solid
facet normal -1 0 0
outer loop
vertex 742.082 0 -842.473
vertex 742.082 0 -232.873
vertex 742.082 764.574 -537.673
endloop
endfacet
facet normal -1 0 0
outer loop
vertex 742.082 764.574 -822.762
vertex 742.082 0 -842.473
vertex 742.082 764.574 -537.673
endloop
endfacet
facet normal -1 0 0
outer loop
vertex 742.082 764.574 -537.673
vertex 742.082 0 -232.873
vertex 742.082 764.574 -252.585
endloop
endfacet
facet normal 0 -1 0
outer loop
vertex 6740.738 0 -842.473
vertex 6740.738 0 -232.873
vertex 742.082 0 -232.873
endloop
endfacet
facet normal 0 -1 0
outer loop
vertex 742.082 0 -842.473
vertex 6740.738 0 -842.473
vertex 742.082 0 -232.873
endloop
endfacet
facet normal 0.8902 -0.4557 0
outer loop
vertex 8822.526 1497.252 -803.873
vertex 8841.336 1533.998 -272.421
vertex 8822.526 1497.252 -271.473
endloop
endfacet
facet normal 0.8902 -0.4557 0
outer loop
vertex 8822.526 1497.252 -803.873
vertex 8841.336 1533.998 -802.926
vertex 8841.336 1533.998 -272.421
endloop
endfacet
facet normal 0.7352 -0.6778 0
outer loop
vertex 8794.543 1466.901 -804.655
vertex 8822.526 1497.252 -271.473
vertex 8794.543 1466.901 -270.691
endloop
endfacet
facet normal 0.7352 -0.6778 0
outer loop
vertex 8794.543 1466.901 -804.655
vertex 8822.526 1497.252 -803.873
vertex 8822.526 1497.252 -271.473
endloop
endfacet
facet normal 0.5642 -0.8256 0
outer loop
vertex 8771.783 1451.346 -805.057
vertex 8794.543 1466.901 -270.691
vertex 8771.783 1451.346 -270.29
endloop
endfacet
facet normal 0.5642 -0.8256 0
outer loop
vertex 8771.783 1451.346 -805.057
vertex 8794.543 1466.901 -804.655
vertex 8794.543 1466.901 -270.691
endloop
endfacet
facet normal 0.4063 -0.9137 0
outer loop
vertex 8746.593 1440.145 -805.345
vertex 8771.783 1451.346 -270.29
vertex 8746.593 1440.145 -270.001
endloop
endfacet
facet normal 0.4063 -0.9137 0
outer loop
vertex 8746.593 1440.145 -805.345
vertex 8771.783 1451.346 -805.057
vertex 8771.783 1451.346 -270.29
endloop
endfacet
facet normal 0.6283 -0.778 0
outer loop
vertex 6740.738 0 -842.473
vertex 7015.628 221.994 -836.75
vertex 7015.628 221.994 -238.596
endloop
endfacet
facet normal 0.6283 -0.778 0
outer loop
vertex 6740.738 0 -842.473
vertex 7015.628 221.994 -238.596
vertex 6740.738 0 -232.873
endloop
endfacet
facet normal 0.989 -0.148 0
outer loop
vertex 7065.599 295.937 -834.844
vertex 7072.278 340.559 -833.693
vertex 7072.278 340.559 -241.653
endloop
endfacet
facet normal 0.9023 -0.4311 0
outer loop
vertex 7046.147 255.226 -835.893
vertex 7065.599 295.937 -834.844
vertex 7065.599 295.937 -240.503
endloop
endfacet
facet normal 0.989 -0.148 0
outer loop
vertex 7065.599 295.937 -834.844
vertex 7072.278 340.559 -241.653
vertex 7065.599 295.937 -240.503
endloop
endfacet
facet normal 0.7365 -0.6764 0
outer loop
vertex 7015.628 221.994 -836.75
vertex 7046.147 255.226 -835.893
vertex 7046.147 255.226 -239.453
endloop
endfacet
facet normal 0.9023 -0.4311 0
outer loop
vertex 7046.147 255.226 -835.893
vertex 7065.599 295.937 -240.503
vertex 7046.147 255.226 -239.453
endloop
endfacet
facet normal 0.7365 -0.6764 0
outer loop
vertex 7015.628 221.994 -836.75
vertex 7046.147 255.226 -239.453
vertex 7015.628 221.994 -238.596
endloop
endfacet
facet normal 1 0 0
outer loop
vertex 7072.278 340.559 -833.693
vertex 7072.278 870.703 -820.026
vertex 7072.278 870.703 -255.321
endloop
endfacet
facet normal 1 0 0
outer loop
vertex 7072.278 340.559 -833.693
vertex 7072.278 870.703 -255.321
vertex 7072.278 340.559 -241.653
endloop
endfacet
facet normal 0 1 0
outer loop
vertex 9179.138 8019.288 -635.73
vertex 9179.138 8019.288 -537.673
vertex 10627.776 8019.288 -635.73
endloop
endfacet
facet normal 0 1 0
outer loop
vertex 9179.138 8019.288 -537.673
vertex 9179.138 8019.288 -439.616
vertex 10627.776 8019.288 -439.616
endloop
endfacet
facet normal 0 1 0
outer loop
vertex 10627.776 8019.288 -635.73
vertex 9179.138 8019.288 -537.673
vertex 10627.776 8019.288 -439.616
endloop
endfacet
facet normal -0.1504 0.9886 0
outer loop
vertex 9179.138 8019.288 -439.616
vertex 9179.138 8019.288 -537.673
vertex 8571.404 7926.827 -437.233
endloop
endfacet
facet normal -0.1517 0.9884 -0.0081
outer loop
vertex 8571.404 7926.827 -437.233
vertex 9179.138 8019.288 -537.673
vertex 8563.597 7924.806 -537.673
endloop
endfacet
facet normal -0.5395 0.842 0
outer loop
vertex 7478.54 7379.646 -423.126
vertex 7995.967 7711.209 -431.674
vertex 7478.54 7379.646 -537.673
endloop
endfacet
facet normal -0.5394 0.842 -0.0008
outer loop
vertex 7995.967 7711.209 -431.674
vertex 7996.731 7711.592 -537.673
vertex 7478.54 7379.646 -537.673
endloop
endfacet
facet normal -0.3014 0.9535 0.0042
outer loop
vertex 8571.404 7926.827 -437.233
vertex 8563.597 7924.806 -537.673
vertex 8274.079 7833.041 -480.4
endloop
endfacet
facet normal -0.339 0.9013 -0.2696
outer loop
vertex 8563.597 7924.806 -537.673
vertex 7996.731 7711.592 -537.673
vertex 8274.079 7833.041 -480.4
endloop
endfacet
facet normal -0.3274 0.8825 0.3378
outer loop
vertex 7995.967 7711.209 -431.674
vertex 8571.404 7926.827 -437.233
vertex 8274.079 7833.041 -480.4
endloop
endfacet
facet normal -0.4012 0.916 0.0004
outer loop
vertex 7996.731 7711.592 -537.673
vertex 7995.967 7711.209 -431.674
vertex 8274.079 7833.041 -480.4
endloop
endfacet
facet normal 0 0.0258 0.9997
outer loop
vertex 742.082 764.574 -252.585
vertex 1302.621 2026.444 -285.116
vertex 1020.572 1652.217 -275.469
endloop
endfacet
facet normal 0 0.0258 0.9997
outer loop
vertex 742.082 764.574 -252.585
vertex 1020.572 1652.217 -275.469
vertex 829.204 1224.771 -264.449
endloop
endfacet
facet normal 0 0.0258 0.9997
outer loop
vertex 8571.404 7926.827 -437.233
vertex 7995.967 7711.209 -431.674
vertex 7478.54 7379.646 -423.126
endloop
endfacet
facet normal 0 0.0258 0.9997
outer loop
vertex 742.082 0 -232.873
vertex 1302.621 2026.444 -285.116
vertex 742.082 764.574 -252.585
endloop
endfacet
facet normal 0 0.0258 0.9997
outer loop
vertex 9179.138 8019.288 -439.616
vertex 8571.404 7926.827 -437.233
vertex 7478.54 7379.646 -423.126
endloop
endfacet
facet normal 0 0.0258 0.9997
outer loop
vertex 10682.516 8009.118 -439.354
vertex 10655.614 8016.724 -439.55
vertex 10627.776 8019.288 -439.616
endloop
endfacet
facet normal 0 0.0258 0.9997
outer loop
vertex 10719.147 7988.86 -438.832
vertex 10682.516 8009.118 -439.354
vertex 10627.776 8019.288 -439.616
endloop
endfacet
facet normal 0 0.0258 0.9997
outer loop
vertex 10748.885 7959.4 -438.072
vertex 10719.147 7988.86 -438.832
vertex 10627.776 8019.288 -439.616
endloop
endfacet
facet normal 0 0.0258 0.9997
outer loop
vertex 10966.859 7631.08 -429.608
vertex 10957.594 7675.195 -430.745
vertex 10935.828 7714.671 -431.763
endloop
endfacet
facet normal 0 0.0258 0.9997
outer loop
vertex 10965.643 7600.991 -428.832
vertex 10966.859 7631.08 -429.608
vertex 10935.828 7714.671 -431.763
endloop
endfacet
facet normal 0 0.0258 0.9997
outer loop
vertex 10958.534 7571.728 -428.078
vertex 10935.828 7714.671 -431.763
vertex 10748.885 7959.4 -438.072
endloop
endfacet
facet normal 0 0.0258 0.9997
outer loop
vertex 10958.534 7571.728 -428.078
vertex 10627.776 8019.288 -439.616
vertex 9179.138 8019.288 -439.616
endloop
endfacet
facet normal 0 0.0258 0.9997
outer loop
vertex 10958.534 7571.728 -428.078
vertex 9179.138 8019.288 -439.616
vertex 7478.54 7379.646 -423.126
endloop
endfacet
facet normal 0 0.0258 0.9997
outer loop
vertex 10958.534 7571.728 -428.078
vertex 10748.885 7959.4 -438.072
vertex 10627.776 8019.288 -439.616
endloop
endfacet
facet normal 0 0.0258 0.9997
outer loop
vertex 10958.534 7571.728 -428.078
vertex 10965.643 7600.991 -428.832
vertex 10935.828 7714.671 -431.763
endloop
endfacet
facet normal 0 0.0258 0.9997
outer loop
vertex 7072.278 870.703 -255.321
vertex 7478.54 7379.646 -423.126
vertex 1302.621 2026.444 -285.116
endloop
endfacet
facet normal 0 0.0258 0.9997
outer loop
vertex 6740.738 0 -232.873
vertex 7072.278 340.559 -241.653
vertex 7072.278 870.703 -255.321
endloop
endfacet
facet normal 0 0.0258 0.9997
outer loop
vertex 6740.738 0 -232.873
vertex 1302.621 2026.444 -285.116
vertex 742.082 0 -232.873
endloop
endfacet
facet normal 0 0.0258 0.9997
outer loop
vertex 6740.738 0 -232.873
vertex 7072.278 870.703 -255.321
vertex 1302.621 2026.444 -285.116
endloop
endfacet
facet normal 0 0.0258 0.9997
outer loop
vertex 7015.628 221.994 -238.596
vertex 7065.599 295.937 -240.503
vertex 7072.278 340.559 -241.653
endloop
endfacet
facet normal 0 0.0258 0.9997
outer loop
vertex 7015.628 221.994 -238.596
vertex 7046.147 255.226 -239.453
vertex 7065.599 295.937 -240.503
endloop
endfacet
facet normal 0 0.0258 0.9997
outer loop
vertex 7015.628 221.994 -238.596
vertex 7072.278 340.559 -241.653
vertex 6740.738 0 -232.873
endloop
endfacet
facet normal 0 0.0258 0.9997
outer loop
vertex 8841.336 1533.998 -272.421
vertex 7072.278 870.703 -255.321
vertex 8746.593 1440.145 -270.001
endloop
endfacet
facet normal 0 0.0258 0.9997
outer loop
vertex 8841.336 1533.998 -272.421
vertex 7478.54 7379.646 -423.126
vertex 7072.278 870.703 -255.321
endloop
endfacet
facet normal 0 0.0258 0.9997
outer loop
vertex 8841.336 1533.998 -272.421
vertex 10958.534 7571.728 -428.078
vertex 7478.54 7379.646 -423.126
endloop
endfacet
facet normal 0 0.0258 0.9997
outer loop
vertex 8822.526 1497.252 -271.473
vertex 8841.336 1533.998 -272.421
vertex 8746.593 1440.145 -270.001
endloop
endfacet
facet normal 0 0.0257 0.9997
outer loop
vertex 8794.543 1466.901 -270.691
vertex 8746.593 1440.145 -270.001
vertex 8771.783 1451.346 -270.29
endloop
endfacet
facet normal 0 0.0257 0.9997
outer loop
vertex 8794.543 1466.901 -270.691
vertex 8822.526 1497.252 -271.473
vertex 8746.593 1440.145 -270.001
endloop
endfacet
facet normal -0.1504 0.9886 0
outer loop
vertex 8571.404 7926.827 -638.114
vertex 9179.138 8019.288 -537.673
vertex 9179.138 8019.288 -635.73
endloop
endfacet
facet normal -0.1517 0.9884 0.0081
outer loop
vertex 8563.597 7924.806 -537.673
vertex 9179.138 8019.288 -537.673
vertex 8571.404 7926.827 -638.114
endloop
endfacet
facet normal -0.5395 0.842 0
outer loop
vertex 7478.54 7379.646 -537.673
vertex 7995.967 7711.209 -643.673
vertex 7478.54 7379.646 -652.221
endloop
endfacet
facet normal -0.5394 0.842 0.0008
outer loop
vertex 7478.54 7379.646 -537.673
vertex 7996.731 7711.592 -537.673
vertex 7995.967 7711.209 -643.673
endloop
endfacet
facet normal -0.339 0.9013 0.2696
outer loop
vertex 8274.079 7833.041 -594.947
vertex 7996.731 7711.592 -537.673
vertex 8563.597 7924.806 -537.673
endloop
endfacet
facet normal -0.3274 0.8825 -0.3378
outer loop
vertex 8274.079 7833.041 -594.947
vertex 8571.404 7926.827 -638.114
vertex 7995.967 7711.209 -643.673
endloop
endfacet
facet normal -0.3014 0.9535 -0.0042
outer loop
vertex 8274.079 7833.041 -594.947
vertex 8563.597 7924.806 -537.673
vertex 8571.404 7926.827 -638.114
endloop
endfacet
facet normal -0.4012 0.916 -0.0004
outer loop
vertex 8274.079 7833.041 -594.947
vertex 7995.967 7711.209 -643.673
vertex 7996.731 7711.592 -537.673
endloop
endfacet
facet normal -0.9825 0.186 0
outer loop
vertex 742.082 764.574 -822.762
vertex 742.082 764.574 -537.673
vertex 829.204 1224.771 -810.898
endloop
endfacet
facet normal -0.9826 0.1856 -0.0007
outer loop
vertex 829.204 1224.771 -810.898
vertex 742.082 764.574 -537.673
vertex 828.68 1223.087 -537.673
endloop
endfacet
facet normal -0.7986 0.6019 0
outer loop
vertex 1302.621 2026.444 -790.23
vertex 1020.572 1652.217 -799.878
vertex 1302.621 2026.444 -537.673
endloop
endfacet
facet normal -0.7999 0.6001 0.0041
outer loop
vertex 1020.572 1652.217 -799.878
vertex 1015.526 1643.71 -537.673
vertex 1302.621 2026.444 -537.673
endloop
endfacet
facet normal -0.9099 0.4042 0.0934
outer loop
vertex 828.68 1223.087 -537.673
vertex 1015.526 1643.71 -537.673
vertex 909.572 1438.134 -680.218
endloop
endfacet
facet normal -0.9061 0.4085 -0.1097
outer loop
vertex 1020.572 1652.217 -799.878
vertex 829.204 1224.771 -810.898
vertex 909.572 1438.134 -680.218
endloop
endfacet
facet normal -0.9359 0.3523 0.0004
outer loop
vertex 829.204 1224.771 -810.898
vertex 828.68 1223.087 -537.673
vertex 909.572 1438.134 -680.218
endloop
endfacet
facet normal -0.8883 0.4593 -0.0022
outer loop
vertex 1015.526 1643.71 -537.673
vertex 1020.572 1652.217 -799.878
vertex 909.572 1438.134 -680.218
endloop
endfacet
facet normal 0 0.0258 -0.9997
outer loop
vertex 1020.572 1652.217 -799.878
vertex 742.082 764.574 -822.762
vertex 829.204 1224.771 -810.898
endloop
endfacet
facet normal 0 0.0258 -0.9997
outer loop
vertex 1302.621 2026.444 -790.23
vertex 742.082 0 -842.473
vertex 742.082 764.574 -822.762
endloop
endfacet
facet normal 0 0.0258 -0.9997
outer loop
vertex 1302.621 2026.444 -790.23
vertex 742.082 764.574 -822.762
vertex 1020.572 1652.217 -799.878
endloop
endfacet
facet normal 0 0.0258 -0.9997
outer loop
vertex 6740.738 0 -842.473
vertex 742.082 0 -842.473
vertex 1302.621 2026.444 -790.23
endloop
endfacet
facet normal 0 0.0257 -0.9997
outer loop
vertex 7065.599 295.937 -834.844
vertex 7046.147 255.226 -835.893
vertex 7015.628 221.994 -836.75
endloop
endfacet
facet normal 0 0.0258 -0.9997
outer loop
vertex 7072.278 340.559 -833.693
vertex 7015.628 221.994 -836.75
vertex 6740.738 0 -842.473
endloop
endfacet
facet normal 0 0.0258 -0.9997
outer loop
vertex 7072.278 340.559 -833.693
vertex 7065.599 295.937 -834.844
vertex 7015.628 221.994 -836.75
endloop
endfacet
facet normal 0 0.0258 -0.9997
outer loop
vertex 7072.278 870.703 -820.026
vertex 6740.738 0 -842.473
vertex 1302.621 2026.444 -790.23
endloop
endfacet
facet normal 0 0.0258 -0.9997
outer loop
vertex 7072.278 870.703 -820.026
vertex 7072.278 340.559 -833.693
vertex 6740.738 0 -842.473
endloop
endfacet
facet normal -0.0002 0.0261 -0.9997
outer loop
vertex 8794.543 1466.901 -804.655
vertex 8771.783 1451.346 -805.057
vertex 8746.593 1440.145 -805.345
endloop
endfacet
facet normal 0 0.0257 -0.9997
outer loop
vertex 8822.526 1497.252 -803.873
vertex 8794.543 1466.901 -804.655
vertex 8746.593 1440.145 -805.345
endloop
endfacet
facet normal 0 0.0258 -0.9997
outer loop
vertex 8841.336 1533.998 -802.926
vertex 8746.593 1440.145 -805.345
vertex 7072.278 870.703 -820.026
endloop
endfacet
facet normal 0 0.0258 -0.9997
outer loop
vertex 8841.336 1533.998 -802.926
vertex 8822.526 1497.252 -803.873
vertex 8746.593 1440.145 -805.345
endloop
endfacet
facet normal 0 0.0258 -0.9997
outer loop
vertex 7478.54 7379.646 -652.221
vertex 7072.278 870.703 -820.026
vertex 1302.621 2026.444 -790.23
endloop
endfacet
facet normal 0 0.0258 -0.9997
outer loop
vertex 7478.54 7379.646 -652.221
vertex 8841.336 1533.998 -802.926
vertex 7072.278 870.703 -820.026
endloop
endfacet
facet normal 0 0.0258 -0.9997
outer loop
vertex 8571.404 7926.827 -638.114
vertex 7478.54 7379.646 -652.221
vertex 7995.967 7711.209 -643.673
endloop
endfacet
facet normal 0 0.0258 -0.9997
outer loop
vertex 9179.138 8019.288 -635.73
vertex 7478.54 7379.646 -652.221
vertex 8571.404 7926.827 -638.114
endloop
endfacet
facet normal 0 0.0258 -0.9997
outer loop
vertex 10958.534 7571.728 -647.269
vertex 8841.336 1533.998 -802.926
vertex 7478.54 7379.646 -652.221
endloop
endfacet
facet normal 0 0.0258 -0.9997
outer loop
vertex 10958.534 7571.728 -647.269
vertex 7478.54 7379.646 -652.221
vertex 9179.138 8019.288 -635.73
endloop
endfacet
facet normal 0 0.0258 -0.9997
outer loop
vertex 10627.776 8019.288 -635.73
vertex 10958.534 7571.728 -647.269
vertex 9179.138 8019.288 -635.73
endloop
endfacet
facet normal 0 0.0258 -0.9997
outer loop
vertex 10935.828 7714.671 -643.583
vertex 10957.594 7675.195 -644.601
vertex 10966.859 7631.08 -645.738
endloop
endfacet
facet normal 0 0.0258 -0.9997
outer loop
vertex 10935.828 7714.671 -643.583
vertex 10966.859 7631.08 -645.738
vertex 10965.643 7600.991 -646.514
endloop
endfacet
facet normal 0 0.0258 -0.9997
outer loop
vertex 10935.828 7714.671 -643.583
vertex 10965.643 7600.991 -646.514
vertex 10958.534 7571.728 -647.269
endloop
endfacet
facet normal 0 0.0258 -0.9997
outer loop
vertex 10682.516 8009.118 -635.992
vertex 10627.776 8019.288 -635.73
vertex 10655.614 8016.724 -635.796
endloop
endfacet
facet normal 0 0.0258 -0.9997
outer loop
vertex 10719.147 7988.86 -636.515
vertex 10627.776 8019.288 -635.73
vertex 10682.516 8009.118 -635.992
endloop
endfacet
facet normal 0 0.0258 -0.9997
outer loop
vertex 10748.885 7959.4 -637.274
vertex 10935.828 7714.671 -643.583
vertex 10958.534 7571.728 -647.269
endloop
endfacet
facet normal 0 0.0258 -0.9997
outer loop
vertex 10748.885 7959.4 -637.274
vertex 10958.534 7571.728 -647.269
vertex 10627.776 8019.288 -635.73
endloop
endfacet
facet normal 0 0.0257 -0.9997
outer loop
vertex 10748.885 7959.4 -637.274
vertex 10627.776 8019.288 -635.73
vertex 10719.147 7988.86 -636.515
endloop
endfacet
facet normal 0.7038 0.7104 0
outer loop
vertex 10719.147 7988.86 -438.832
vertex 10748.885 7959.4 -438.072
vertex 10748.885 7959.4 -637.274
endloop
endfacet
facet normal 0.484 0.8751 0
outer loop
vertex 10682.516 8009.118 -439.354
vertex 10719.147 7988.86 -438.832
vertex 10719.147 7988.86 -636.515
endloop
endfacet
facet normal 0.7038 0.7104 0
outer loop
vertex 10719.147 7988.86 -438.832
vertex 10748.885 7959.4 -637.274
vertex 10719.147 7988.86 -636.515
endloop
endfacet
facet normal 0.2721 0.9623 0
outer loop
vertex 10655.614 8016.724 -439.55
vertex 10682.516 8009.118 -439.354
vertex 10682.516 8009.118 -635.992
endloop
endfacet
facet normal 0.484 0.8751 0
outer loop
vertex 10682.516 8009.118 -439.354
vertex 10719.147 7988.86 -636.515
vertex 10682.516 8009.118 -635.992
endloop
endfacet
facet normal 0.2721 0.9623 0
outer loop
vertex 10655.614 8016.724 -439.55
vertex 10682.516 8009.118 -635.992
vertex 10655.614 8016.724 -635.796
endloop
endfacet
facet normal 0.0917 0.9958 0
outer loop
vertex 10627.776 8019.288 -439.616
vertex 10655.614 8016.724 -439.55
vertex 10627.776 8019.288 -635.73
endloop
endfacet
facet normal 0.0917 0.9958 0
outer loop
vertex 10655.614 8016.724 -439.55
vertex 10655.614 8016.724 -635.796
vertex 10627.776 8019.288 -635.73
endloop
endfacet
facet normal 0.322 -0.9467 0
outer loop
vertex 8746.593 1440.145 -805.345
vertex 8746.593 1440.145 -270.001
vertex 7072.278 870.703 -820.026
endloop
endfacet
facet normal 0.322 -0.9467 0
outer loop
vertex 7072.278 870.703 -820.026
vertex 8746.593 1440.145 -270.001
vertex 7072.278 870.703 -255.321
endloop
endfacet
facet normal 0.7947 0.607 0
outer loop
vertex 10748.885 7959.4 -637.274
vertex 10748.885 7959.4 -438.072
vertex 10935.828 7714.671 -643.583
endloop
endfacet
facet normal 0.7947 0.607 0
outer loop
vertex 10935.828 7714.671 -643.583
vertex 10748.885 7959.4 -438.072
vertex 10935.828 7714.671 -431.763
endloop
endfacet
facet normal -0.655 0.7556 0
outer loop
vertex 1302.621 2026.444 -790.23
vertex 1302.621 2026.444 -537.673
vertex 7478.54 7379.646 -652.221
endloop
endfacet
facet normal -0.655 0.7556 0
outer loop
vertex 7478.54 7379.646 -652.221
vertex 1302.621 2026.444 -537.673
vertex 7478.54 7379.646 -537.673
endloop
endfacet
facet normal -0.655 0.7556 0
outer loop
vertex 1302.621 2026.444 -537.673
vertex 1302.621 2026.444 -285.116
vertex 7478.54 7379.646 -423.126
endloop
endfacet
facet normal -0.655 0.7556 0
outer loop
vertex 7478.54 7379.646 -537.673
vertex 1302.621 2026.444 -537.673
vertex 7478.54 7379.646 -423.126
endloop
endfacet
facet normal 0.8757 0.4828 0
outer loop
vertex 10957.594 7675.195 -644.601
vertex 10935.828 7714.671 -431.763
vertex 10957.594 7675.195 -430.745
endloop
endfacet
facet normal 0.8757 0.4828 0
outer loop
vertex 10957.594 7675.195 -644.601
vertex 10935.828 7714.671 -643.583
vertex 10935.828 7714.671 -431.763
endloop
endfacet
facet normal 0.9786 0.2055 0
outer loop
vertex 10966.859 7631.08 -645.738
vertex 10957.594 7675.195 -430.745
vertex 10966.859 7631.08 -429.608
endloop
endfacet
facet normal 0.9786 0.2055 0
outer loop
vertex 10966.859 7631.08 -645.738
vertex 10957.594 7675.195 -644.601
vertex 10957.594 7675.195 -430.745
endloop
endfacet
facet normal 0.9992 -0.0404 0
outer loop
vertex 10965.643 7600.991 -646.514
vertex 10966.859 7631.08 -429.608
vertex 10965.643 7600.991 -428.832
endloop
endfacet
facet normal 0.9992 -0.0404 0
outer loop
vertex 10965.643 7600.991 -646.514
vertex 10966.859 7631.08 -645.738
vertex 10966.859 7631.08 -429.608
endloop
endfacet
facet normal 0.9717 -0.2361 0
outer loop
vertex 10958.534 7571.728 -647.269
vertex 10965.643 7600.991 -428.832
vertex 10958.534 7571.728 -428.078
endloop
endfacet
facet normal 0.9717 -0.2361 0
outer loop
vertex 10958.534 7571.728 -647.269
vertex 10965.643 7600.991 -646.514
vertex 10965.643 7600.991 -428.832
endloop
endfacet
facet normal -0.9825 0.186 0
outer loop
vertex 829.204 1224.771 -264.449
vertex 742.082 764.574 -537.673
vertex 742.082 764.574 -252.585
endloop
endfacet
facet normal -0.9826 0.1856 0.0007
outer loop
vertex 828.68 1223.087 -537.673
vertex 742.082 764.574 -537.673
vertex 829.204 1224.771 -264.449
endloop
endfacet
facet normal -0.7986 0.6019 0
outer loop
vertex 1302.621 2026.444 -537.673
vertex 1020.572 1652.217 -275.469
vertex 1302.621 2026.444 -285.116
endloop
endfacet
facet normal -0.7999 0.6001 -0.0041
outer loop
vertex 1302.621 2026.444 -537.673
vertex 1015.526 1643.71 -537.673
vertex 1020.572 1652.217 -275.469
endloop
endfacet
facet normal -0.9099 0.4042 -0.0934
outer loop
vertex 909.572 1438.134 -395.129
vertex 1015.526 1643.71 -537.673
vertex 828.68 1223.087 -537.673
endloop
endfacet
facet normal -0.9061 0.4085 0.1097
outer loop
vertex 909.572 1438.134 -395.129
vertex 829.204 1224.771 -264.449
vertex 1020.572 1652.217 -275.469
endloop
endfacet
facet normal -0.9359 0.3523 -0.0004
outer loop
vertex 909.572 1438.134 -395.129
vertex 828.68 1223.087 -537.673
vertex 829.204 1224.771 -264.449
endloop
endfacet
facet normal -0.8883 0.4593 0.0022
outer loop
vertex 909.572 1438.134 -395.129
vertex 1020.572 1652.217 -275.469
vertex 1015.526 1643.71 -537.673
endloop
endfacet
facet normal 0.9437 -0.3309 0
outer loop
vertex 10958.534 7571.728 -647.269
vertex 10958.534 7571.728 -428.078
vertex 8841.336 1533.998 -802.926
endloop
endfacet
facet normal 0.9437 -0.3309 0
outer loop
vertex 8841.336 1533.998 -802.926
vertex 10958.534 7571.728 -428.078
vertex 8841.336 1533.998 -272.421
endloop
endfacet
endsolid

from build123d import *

# Parameters (mm, degrees)
BOSS_EXTRUDE1_DEPTH     = 304.8
CUT_EXTRUDE2_DEPTH      = 13037.539327922
CUT_EXTRUDE2_DEPTH_BACK = 13037.539327922
FILLET1_R               = 152.4
FILLET2_R               = 152.4
FILLET3_R               = 152.4
FILLET4_R               = 152.4


with BuildPart() as part:
    # Sketch5 → Boss-Extrude1 (new, symmetric)
    with BuildSketch(Plane.XY.offset(-537.673251463)):
        with BuildLine():
            Line((742.082193598, 0), (742.082193598, 764.574485823))
            add(Edge.make_bspline(
                [(742.082193598, 764.574485823), (796.791514491, 1480.759447712), (1302.621022267, 2026.444470026)],
                knots=[0, 0, 0, 1, 1, 1], degree=2))
            Line((1302.621022267, 2026.444470026), (7478.539858356, 7379.645861756))
            add(Edge.make_bspline(
                [(9179.137959243, 8019.288), (8219.319485977, 7966.614763447), (7478.539858356, 7379.645861756)],
                knots=[0, 0, 0, 1, 1, 1], degree=2))
            Line((9179.137959243, 8019.288), (10703.137959243, 8019.288))
            Line((10703.137959243, 8019.288), (10985.744450733, 7649.32510556))
            Line((10985.744450733, 7649.32510556), (8816.798294342, 1464.02172706))
            Line((8816.798294342, 1464.02172706), (7072.277988354, 870.702642997))
            Line((7072.277988354, 870.702642997), (7072.277988354, 267.743129387))
            Line((7072.277988354, 267.743129387), (6740.737959243, 0))
            Line((6740.737959243, 0), (742.082193598, 0))
        make_face()
    extrude(amount=BOSS_EXTRUDE1_DEPTH, both=True)

    # Sketch7 → Cut-Extrude2 (cut, two sides: drawn at the far end of the back side and taken through both)
    with BuildSketch(Plane.ZY.offset(-742.082193598).offset(-CUT_EXTRUDE2_DEPTH_BACK)):
        Polygon((-842.473251463, 0), (-635.730191879, 8019.288), (-1159.108406809, 8019.288), (-1159.108406809, 0), align=None)
        Polygon((-439.616311048, 8019.288), (-232.873251463, 0), (0, 0), (55.656264928, 8019.288), align=None)
    extrude(amount=CUT_EXTRUDE2_DEPTH + CUT_EXTRUDE2_DEPTH_BACK, mode=Mode.SUBTRACT)

    # Fillet1
    fillet1_edges = [part.edges().sort_by_distance(p)[0] for p in [
        (10703.137959243, 8019.288, -537.673251463),
    ]]
    fillet(fillet1_edges, radius=FILLET1_R)

    # Fillet2
    fillet2_edges = [part.edges().sort_by_distance(p)[0] for p in [
        (10985.744450733, 7649.32510556, -537.673251463),
    ]]
    fillet(fillet2_edges, radius=FILLET2_R)

    # Fillet3
    fillet3_edges = [part.edges().sort_by_distance(p)[0] for p in [
        (8816.798294342, 1464.02172706, -537.673251463),
    ]]
    fillet(fillet3_edges, radius=FILLET3_R)

    # Fillet4
    fillet4_edges = [part.edges().sort_by_distance(p)[0] for p in [
        (7072.277988354, 267.743129387, -537.673251463),
    ]]
    fillet(fillet4_edges, radius=FILLET4_R)


solid = part.part
